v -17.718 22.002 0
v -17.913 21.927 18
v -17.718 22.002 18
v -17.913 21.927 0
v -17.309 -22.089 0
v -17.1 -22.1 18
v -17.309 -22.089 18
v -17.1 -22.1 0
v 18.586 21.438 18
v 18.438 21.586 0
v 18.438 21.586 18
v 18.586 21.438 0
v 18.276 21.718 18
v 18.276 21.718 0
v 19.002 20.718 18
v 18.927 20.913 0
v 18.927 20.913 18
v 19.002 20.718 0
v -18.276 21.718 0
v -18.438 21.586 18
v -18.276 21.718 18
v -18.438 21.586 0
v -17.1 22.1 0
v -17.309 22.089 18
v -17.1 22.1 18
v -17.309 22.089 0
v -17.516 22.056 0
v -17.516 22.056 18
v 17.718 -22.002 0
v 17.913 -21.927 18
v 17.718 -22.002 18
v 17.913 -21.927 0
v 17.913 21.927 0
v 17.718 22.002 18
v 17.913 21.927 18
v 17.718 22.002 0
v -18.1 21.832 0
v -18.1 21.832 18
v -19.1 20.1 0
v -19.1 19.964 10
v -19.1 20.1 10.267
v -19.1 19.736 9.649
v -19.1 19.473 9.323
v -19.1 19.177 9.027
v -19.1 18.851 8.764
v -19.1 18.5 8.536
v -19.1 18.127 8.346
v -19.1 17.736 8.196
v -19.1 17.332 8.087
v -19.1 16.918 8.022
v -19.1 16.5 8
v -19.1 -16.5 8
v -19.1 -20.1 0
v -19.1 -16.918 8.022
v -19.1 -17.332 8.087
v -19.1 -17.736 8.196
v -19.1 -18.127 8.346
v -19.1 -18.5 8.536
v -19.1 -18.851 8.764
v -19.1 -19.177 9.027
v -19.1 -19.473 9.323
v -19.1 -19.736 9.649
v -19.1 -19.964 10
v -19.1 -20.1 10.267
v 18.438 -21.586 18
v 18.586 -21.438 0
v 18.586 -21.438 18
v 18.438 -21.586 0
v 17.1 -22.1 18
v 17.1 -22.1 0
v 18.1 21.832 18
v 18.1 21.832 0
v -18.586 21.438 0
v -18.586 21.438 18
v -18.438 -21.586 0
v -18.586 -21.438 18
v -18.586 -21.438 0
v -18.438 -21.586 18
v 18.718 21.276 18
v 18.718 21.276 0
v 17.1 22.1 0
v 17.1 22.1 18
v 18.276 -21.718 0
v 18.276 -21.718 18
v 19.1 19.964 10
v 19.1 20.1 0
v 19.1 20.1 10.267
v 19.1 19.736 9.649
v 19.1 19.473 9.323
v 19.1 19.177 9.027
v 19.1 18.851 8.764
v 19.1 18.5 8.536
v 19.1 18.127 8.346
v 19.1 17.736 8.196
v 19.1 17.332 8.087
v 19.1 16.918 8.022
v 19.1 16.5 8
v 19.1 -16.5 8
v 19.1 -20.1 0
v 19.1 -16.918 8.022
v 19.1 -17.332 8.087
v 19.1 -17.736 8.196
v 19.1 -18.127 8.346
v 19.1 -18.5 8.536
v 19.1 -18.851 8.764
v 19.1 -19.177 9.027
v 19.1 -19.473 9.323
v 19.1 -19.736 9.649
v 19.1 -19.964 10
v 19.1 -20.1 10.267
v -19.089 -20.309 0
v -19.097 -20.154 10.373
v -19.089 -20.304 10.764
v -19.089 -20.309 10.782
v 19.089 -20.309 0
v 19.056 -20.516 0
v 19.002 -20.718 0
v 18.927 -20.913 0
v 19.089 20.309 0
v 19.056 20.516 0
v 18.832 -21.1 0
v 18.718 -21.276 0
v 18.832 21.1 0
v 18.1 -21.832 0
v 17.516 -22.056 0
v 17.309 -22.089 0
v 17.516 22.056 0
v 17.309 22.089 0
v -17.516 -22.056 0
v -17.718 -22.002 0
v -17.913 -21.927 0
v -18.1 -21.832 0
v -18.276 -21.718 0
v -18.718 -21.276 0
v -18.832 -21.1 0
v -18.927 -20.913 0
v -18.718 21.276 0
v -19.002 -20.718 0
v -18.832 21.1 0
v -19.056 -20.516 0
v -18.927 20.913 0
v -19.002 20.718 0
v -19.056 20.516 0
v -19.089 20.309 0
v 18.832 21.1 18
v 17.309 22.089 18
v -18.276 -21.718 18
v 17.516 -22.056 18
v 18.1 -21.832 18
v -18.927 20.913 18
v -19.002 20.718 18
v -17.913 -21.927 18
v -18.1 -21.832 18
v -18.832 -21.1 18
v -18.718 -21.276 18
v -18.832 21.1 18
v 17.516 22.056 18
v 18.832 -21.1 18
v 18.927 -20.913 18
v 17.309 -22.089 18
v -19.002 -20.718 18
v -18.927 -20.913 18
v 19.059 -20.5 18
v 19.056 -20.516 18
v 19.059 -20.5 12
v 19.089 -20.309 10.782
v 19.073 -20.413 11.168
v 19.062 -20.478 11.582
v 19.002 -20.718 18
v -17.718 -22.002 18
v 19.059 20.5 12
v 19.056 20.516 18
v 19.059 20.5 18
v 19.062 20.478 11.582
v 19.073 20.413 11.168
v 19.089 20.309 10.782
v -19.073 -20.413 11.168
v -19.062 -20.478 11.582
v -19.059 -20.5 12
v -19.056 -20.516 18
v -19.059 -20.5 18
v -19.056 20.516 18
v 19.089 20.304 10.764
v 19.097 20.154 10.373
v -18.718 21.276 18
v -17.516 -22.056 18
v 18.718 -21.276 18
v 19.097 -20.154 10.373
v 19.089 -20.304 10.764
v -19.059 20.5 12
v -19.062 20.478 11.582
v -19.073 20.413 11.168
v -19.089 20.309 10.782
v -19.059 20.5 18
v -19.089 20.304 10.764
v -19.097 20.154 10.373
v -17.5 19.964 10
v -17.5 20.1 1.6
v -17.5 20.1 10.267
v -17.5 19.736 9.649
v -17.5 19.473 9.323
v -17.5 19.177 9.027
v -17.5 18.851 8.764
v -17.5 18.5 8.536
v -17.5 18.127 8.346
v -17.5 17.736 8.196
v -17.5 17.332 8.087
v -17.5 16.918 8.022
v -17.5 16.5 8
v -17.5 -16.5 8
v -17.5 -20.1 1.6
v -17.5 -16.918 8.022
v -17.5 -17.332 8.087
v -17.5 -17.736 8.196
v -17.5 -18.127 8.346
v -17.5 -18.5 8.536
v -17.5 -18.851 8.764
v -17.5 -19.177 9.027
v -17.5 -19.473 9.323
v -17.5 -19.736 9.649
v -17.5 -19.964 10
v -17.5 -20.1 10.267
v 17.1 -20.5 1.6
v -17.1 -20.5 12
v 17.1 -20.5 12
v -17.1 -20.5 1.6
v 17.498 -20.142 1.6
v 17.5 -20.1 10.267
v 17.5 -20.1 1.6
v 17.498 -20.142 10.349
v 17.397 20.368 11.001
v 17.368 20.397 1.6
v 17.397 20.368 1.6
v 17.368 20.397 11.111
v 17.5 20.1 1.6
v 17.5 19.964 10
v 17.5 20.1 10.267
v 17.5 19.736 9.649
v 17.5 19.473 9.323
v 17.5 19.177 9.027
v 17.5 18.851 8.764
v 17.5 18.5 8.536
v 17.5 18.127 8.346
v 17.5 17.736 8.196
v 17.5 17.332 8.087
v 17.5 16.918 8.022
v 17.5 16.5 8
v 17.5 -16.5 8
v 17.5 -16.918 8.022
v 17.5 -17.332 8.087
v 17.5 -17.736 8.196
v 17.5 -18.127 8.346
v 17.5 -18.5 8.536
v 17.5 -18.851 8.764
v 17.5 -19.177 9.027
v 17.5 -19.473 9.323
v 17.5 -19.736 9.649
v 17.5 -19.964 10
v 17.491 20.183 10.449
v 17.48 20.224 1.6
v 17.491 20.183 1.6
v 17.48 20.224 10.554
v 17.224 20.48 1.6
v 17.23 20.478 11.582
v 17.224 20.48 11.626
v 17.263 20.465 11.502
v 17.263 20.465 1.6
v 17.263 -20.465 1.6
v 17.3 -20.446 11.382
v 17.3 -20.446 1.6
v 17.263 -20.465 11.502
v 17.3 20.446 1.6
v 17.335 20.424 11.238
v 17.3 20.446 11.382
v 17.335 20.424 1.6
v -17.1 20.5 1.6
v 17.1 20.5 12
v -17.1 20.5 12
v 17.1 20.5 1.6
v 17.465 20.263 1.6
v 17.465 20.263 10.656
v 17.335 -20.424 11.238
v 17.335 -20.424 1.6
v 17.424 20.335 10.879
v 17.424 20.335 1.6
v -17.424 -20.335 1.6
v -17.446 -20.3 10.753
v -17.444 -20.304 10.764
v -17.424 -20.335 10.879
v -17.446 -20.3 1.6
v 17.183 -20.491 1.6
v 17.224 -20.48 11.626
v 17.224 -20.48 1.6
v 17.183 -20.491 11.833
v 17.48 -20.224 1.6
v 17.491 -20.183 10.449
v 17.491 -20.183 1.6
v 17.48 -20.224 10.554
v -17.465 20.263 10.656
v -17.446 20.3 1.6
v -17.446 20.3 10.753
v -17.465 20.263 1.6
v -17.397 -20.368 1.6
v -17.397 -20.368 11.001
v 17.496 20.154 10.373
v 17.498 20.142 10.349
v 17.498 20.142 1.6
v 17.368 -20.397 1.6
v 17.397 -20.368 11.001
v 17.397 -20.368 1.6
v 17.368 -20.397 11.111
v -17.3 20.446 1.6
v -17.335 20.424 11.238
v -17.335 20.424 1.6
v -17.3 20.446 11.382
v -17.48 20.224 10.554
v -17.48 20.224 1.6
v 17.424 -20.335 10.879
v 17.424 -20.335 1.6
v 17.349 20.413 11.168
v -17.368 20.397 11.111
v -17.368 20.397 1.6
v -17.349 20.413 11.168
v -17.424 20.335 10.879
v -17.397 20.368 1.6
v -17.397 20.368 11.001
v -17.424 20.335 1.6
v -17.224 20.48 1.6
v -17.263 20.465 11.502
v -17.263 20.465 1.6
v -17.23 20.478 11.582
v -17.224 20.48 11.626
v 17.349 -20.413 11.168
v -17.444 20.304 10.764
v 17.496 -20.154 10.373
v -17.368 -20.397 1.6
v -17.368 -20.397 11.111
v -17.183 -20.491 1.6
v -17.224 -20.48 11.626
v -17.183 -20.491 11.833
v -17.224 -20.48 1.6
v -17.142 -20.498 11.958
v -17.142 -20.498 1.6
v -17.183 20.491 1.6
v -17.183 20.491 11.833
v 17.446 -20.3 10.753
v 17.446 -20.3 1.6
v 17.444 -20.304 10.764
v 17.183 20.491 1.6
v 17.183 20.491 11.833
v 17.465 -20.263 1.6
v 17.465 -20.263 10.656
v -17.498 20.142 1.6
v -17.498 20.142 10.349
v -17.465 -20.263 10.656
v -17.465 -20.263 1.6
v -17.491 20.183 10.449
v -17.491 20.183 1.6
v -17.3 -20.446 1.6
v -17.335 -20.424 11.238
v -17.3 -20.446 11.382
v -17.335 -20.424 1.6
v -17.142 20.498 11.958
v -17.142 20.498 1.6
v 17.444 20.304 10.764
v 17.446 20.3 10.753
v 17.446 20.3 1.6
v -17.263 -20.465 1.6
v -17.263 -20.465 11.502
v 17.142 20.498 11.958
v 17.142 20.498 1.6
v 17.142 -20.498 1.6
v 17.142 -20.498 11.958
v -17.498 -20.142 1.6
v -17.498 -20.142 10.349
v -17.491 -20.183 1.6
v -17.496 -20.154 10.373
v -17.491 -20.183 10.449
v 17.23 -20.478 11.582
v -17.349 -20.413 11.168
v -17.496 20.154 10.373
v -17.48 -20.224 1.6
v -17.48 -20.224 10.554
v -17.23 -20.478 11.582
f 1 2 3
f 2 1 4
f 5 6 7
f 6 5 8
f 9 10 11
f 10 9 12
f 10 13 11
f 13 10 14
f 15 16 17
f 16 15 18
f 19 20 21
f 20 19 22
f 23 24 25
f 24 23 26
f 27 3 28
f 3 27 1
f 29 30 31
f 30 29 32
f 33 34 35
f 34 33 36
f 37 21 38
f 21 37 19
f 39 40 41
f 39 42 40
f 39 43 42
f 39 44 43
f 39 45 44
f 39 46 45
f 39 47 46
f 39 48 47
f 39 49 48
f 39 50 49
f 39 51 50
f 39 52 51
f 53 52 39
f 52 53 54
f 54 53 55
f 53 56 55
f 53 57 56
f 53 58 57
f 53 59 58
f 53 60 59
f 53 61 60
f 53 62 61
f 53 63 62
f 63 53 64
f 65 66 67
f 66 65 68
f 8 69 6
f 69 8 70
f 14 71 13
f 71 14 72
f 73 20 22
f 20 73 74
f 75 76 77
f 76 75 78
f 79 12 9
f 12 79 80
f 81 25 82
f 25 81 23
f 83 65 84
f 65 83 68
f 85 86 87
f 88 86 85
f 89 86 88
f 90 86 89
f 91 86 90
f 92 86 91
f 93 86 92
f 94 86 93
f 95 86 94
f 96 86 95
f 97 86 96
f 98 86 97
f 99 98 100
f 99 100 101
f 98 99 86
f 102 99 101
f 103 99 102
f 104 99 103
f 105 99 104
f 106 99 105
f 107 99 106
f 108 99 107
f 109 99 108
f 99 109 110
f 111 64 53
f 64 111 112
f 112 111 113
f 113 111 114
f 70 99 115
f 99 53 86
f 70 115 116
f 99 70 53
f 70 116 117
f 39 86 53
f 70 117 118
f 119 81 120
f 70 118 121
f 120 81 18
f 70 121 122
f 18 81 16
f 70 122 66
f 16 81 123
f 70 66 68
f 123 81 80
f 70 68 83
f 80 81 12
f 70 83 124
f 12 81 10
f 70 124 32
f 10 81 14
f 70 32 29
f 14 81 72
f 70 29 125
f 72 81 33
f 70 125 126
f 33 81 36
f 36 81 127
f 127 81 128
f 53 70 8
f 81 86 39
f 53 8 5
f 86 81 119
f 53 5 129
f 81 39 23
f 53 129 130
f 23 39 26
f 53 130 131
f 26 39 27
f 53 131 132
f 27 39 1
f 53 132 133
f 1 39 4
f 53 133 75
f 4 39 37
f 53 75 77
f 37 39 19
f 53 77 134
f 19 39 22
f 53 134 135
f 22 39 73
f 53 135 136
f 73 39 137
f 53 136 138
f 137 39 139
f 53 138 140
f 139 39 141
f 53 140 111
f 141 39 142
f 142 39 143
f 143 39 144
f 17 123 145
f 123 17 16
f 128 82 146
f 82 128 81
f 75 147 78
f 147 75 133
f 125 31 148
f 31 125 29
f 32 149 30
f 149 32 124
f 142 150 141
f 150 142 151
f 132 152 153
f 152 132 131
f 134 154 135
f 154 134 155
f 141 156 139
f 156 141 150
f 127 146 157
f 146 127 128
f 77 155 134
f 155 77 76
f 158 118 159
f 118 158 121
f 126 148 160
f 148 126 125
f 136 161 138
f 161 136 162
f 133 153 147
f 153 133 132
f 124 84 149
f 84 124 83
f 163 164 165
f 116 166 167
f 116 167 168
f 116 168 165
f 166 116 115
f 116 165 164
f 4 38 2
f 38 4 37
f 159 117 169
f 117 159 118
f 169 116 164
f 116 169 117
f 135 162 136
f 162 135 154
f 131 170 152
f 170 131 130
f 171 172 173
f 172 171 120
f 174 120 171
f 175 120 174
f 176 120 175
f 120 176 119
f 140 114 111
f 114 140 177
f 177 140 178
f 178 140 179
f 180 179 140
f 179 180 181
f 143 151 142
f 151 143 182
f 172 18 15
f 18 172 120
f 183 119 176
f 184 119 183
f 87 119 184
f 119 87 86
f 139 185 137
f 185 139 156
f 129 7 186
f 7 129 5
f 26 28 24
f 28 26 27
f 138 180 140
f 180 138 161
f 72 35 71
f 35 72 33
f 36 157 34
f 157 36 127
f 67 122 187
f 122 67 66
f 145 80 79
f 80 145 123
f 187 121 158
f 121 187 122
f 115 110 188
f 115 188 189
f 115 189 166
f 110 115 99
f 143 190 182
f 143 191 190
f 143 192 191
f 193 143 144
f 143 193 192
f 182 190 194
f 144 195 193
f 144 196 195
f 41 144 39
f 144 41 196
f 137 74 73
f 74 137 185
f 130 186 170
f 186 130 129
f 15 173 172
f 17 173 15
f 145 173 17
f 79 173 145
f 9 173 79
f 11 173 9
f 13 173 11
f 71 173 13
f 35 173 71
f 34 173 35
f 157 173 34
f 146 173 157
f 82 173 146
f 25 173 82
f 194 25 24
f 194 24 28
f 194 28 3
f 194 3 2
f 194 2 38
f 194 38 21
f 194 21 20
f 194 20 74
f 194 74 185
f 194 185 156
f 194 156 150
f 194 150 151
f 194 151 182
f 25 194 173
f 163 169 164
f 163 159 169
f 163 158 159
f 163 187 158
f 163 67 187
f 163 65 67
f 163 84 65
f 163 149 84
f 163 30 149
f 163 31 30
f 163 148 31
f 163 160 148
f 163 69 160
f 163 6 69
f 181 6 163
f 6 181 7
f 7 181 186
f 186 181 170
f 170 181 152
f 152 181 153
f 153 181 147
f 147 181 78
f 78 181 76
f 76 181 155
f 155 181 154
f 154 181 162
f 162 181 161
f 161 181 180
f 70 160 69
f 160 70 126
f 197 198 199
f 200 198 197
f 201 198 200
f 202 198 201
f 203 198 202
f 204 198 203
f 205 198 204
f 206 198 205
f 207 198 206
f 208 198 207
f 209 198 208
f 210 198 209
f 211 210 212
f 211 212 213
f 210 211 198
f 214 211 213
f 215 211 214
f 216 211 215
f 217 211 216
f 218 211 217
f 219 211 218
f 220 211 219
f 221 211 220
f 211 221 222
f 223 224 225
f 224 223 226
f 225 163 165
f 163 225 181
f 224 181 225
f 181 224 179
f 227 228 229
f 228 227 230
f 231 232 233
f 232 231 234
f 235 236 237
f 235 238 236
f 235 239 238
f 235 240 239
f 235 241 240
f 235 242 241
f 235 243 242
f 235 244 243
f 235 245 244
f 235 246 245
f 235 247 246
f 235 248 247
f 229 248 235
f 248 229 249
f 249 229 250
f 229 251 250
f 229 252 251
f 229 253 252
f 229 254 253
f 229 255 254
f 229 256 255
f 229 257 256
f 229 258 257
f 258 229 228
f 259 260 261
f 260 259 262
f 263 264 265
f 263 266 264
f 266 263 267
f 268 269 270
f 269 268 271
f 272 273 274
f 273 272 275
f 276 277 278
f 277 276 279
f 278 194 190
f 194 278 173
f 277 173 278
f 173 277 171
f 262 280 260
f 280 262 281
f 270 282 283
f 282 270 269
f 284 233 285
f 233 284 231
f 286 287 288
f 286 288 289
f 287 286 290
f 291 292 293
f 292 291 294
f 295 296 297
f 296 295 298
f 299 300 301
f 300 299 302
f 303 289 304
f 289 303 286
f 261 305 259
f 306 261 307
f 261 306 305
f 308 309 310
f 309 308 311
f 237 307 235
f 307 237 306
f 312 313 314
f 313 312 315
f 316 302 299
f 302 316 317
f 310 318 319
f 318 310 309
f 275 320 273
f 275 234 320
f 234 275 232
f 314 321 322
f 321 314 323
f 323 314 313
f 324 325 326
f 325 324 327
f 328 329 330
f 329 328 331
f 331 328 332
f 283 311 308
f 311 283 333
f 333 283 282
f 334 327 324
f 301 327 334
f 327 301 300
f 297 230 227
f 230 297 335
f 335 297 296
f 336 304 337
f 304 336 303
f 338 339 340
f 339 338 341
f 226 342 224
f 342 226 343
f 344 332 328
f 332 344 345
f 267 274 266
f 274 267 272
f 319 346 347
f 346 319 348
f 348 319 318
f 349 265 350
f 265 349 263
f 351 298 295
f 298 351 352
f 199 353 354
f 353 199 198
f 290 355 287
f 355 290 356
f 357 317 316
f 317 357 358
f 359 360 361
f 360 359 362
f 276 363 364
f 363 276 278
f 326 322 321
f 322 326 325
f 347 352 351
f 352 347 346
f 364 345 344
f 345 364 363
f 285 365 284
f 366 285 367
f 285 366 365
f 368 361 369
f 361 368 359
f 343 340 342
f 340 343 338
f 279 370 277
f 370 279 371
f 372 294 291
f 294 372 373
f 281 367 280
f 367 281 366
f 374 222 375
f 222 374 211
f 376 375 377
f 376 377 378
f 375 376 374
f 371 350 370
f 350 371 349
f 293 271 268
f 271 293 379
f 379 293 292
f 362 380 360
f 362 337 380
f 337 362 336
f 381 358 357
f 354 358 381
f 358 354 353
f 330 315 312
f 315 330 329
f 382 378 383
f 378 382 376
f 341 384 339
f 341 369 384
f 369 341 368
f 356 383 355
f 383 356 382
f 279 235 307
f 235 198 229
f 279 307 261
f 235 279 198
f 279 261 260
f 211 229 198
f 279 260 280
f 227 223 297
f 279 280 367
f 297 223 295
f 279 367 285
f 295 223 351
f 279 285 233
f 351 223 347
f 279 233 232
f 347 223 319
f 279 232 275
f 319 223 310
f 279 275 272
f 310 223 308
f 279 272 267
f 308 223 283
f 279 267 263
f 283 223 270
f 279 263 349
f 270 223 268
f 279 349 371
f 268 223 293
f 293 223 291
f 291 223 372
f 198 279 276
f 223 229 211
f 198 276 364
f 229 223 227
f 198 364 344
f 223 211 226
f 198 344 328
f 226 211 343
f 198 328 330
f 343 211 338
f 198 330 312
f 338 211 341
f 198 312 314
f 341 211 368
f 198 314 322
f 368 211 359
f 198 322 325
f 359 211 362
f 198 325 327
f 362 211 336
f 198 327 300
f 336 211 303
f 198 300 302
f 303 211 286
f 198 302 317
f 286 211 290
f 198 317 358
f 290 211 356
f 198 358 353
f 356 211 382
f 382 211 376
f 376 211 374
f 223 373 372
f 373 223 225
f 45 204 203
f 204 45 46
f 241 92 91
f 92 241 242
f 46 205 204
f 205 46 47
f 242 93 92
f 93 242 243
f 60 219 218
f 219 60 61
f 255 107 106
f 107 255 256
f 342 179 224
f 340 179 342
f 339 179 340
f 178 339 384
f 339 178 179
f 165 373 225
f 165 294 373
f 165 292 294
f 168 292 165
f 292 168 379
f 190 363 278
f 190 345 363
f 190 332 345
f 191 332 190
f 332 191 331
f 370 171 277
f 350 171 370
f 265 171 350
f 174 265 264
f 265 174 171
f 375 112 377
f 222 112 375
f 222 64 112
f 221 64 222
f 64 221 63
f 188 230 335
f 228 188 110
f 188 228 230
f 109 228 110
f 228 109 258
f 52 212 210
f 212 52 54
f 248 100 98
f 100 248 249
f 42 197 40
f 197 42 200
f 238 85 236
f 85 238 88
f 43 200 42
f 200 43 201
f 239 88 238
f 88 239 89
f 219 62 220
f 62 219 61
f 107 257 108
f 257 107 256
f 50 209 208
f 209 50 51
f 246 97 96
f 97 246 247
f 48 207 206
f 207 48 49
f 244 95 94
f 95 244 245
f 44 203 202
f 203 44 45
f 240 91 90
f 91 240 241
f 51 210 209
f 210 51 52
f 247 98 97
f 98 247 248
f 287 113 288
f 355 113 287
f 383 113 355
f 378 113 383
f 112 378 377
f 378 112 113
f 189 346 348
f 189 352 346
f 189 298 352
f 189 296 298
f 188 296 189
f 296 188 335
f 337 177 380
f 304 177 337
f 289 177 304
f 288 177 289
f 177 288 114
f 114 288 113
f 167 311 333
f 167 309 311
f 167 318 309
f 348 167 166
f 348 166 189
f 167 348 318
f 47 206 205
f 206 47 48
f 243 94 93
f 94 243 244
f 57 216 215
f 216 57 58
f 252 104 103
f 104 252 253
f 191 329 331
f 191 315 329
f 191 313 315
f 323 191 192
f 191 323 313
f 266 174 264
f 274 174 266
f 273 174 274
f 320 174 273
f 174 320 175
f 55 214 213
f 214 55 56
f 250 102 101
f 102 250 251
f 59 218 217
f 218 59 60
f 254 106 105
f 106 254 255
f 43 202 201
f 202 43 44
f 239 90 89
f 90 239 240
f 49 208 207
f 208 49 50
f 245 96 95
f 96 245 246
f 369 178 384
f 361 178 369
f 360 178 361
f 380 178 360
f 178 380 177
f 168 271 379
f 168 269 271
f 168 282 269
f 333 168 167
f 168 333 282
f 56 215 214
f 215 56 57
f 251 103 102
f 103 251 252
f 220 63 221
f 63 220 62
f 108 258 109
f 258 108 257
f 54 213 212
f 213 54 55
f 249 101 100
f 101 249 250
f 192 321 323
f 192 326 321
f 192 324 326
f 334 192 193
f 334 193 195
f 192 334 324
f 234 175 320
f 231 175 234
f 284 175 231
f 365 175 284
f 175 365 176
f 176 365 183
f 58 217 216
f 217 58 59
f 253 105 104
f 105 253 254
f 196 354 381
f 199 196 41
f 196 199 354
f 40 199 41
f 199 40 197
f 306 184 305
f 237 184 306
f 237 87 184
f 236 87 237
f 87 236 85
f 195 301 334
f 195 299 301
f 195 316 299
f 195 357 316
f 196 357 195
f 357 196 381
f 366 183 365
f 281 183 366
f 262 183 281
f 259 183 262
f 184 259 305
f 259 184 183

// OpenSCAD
// --- PARAMETERS ---

// 1. Inner Dimensions (To fit the GPS)
inner_w = 35.0; // Width (X-axis)
inner_l = 41.0; // Length (Y-axis)

// 2. Heights
tall_z  = 18.0; // Top and Bottom wall height
short_z = 8.0;  // Left and Right wall height

// 3. Wall Settings
wall = 1.6;     // Wall thickness
floor = 1.6;    // Base thickness
rad = 2.0;      // Outer corner rounding radius

// 4. The Sweep!
trans_rad = 4.0; // Radius of the curved join between short and tall edges

// --- CALCULATIONS ---
outer_w = inner_w + (wall * 2);
outer_l = inner_l + (wall * 2);
$fn = 60; // Smoothness

// --- MODULES ---

// Helper to make rounded boxes
module rounded_box(w, l, h, r) {
    hull() {
        for(x=[-1,1], y=[-1,1]) {
            translate([x*(w/2 - r), y*(l/2 - r), 0])
                cylinder(r=r, h=h);
        }
    }
}

// The Cover
module gps_cover() {
    difference() {
        // 1. The Solid Outer Box (Tall)
        rounded_box(outer_w, outer_l, tall_z, rad);

        // 2. Hollow out the inside
        translate([0, 0, floor])
            rounded_box(inner_w, inner_l, tall_z + 1, max(0.1, rad - wall));

        // 3. Slice the sides down with a smooth fillet
        // Instead of a simple cube, we use a custom hull to carve the swoop
        hull() {
            // The two curved bottom edges of the cutter
            for (y = [-1, 1]) {
                translate([0, y * (inner_l/2 - trans_rad), short_z + trans_rad])
                    rotate([0, 90, 0])
                    cylinder(r=trans_rad, h=outer_w + 10, center=true);
            }
            // A block at the top to ensure everything above the curve is deleted
            translate([0, 0, tall_z + 10])
                cube([outer_w + 10, inner_l, 0.1], center=true);
        }
    }
}

// --- RENDER ---
color("DarkCyan") gps_cover();
